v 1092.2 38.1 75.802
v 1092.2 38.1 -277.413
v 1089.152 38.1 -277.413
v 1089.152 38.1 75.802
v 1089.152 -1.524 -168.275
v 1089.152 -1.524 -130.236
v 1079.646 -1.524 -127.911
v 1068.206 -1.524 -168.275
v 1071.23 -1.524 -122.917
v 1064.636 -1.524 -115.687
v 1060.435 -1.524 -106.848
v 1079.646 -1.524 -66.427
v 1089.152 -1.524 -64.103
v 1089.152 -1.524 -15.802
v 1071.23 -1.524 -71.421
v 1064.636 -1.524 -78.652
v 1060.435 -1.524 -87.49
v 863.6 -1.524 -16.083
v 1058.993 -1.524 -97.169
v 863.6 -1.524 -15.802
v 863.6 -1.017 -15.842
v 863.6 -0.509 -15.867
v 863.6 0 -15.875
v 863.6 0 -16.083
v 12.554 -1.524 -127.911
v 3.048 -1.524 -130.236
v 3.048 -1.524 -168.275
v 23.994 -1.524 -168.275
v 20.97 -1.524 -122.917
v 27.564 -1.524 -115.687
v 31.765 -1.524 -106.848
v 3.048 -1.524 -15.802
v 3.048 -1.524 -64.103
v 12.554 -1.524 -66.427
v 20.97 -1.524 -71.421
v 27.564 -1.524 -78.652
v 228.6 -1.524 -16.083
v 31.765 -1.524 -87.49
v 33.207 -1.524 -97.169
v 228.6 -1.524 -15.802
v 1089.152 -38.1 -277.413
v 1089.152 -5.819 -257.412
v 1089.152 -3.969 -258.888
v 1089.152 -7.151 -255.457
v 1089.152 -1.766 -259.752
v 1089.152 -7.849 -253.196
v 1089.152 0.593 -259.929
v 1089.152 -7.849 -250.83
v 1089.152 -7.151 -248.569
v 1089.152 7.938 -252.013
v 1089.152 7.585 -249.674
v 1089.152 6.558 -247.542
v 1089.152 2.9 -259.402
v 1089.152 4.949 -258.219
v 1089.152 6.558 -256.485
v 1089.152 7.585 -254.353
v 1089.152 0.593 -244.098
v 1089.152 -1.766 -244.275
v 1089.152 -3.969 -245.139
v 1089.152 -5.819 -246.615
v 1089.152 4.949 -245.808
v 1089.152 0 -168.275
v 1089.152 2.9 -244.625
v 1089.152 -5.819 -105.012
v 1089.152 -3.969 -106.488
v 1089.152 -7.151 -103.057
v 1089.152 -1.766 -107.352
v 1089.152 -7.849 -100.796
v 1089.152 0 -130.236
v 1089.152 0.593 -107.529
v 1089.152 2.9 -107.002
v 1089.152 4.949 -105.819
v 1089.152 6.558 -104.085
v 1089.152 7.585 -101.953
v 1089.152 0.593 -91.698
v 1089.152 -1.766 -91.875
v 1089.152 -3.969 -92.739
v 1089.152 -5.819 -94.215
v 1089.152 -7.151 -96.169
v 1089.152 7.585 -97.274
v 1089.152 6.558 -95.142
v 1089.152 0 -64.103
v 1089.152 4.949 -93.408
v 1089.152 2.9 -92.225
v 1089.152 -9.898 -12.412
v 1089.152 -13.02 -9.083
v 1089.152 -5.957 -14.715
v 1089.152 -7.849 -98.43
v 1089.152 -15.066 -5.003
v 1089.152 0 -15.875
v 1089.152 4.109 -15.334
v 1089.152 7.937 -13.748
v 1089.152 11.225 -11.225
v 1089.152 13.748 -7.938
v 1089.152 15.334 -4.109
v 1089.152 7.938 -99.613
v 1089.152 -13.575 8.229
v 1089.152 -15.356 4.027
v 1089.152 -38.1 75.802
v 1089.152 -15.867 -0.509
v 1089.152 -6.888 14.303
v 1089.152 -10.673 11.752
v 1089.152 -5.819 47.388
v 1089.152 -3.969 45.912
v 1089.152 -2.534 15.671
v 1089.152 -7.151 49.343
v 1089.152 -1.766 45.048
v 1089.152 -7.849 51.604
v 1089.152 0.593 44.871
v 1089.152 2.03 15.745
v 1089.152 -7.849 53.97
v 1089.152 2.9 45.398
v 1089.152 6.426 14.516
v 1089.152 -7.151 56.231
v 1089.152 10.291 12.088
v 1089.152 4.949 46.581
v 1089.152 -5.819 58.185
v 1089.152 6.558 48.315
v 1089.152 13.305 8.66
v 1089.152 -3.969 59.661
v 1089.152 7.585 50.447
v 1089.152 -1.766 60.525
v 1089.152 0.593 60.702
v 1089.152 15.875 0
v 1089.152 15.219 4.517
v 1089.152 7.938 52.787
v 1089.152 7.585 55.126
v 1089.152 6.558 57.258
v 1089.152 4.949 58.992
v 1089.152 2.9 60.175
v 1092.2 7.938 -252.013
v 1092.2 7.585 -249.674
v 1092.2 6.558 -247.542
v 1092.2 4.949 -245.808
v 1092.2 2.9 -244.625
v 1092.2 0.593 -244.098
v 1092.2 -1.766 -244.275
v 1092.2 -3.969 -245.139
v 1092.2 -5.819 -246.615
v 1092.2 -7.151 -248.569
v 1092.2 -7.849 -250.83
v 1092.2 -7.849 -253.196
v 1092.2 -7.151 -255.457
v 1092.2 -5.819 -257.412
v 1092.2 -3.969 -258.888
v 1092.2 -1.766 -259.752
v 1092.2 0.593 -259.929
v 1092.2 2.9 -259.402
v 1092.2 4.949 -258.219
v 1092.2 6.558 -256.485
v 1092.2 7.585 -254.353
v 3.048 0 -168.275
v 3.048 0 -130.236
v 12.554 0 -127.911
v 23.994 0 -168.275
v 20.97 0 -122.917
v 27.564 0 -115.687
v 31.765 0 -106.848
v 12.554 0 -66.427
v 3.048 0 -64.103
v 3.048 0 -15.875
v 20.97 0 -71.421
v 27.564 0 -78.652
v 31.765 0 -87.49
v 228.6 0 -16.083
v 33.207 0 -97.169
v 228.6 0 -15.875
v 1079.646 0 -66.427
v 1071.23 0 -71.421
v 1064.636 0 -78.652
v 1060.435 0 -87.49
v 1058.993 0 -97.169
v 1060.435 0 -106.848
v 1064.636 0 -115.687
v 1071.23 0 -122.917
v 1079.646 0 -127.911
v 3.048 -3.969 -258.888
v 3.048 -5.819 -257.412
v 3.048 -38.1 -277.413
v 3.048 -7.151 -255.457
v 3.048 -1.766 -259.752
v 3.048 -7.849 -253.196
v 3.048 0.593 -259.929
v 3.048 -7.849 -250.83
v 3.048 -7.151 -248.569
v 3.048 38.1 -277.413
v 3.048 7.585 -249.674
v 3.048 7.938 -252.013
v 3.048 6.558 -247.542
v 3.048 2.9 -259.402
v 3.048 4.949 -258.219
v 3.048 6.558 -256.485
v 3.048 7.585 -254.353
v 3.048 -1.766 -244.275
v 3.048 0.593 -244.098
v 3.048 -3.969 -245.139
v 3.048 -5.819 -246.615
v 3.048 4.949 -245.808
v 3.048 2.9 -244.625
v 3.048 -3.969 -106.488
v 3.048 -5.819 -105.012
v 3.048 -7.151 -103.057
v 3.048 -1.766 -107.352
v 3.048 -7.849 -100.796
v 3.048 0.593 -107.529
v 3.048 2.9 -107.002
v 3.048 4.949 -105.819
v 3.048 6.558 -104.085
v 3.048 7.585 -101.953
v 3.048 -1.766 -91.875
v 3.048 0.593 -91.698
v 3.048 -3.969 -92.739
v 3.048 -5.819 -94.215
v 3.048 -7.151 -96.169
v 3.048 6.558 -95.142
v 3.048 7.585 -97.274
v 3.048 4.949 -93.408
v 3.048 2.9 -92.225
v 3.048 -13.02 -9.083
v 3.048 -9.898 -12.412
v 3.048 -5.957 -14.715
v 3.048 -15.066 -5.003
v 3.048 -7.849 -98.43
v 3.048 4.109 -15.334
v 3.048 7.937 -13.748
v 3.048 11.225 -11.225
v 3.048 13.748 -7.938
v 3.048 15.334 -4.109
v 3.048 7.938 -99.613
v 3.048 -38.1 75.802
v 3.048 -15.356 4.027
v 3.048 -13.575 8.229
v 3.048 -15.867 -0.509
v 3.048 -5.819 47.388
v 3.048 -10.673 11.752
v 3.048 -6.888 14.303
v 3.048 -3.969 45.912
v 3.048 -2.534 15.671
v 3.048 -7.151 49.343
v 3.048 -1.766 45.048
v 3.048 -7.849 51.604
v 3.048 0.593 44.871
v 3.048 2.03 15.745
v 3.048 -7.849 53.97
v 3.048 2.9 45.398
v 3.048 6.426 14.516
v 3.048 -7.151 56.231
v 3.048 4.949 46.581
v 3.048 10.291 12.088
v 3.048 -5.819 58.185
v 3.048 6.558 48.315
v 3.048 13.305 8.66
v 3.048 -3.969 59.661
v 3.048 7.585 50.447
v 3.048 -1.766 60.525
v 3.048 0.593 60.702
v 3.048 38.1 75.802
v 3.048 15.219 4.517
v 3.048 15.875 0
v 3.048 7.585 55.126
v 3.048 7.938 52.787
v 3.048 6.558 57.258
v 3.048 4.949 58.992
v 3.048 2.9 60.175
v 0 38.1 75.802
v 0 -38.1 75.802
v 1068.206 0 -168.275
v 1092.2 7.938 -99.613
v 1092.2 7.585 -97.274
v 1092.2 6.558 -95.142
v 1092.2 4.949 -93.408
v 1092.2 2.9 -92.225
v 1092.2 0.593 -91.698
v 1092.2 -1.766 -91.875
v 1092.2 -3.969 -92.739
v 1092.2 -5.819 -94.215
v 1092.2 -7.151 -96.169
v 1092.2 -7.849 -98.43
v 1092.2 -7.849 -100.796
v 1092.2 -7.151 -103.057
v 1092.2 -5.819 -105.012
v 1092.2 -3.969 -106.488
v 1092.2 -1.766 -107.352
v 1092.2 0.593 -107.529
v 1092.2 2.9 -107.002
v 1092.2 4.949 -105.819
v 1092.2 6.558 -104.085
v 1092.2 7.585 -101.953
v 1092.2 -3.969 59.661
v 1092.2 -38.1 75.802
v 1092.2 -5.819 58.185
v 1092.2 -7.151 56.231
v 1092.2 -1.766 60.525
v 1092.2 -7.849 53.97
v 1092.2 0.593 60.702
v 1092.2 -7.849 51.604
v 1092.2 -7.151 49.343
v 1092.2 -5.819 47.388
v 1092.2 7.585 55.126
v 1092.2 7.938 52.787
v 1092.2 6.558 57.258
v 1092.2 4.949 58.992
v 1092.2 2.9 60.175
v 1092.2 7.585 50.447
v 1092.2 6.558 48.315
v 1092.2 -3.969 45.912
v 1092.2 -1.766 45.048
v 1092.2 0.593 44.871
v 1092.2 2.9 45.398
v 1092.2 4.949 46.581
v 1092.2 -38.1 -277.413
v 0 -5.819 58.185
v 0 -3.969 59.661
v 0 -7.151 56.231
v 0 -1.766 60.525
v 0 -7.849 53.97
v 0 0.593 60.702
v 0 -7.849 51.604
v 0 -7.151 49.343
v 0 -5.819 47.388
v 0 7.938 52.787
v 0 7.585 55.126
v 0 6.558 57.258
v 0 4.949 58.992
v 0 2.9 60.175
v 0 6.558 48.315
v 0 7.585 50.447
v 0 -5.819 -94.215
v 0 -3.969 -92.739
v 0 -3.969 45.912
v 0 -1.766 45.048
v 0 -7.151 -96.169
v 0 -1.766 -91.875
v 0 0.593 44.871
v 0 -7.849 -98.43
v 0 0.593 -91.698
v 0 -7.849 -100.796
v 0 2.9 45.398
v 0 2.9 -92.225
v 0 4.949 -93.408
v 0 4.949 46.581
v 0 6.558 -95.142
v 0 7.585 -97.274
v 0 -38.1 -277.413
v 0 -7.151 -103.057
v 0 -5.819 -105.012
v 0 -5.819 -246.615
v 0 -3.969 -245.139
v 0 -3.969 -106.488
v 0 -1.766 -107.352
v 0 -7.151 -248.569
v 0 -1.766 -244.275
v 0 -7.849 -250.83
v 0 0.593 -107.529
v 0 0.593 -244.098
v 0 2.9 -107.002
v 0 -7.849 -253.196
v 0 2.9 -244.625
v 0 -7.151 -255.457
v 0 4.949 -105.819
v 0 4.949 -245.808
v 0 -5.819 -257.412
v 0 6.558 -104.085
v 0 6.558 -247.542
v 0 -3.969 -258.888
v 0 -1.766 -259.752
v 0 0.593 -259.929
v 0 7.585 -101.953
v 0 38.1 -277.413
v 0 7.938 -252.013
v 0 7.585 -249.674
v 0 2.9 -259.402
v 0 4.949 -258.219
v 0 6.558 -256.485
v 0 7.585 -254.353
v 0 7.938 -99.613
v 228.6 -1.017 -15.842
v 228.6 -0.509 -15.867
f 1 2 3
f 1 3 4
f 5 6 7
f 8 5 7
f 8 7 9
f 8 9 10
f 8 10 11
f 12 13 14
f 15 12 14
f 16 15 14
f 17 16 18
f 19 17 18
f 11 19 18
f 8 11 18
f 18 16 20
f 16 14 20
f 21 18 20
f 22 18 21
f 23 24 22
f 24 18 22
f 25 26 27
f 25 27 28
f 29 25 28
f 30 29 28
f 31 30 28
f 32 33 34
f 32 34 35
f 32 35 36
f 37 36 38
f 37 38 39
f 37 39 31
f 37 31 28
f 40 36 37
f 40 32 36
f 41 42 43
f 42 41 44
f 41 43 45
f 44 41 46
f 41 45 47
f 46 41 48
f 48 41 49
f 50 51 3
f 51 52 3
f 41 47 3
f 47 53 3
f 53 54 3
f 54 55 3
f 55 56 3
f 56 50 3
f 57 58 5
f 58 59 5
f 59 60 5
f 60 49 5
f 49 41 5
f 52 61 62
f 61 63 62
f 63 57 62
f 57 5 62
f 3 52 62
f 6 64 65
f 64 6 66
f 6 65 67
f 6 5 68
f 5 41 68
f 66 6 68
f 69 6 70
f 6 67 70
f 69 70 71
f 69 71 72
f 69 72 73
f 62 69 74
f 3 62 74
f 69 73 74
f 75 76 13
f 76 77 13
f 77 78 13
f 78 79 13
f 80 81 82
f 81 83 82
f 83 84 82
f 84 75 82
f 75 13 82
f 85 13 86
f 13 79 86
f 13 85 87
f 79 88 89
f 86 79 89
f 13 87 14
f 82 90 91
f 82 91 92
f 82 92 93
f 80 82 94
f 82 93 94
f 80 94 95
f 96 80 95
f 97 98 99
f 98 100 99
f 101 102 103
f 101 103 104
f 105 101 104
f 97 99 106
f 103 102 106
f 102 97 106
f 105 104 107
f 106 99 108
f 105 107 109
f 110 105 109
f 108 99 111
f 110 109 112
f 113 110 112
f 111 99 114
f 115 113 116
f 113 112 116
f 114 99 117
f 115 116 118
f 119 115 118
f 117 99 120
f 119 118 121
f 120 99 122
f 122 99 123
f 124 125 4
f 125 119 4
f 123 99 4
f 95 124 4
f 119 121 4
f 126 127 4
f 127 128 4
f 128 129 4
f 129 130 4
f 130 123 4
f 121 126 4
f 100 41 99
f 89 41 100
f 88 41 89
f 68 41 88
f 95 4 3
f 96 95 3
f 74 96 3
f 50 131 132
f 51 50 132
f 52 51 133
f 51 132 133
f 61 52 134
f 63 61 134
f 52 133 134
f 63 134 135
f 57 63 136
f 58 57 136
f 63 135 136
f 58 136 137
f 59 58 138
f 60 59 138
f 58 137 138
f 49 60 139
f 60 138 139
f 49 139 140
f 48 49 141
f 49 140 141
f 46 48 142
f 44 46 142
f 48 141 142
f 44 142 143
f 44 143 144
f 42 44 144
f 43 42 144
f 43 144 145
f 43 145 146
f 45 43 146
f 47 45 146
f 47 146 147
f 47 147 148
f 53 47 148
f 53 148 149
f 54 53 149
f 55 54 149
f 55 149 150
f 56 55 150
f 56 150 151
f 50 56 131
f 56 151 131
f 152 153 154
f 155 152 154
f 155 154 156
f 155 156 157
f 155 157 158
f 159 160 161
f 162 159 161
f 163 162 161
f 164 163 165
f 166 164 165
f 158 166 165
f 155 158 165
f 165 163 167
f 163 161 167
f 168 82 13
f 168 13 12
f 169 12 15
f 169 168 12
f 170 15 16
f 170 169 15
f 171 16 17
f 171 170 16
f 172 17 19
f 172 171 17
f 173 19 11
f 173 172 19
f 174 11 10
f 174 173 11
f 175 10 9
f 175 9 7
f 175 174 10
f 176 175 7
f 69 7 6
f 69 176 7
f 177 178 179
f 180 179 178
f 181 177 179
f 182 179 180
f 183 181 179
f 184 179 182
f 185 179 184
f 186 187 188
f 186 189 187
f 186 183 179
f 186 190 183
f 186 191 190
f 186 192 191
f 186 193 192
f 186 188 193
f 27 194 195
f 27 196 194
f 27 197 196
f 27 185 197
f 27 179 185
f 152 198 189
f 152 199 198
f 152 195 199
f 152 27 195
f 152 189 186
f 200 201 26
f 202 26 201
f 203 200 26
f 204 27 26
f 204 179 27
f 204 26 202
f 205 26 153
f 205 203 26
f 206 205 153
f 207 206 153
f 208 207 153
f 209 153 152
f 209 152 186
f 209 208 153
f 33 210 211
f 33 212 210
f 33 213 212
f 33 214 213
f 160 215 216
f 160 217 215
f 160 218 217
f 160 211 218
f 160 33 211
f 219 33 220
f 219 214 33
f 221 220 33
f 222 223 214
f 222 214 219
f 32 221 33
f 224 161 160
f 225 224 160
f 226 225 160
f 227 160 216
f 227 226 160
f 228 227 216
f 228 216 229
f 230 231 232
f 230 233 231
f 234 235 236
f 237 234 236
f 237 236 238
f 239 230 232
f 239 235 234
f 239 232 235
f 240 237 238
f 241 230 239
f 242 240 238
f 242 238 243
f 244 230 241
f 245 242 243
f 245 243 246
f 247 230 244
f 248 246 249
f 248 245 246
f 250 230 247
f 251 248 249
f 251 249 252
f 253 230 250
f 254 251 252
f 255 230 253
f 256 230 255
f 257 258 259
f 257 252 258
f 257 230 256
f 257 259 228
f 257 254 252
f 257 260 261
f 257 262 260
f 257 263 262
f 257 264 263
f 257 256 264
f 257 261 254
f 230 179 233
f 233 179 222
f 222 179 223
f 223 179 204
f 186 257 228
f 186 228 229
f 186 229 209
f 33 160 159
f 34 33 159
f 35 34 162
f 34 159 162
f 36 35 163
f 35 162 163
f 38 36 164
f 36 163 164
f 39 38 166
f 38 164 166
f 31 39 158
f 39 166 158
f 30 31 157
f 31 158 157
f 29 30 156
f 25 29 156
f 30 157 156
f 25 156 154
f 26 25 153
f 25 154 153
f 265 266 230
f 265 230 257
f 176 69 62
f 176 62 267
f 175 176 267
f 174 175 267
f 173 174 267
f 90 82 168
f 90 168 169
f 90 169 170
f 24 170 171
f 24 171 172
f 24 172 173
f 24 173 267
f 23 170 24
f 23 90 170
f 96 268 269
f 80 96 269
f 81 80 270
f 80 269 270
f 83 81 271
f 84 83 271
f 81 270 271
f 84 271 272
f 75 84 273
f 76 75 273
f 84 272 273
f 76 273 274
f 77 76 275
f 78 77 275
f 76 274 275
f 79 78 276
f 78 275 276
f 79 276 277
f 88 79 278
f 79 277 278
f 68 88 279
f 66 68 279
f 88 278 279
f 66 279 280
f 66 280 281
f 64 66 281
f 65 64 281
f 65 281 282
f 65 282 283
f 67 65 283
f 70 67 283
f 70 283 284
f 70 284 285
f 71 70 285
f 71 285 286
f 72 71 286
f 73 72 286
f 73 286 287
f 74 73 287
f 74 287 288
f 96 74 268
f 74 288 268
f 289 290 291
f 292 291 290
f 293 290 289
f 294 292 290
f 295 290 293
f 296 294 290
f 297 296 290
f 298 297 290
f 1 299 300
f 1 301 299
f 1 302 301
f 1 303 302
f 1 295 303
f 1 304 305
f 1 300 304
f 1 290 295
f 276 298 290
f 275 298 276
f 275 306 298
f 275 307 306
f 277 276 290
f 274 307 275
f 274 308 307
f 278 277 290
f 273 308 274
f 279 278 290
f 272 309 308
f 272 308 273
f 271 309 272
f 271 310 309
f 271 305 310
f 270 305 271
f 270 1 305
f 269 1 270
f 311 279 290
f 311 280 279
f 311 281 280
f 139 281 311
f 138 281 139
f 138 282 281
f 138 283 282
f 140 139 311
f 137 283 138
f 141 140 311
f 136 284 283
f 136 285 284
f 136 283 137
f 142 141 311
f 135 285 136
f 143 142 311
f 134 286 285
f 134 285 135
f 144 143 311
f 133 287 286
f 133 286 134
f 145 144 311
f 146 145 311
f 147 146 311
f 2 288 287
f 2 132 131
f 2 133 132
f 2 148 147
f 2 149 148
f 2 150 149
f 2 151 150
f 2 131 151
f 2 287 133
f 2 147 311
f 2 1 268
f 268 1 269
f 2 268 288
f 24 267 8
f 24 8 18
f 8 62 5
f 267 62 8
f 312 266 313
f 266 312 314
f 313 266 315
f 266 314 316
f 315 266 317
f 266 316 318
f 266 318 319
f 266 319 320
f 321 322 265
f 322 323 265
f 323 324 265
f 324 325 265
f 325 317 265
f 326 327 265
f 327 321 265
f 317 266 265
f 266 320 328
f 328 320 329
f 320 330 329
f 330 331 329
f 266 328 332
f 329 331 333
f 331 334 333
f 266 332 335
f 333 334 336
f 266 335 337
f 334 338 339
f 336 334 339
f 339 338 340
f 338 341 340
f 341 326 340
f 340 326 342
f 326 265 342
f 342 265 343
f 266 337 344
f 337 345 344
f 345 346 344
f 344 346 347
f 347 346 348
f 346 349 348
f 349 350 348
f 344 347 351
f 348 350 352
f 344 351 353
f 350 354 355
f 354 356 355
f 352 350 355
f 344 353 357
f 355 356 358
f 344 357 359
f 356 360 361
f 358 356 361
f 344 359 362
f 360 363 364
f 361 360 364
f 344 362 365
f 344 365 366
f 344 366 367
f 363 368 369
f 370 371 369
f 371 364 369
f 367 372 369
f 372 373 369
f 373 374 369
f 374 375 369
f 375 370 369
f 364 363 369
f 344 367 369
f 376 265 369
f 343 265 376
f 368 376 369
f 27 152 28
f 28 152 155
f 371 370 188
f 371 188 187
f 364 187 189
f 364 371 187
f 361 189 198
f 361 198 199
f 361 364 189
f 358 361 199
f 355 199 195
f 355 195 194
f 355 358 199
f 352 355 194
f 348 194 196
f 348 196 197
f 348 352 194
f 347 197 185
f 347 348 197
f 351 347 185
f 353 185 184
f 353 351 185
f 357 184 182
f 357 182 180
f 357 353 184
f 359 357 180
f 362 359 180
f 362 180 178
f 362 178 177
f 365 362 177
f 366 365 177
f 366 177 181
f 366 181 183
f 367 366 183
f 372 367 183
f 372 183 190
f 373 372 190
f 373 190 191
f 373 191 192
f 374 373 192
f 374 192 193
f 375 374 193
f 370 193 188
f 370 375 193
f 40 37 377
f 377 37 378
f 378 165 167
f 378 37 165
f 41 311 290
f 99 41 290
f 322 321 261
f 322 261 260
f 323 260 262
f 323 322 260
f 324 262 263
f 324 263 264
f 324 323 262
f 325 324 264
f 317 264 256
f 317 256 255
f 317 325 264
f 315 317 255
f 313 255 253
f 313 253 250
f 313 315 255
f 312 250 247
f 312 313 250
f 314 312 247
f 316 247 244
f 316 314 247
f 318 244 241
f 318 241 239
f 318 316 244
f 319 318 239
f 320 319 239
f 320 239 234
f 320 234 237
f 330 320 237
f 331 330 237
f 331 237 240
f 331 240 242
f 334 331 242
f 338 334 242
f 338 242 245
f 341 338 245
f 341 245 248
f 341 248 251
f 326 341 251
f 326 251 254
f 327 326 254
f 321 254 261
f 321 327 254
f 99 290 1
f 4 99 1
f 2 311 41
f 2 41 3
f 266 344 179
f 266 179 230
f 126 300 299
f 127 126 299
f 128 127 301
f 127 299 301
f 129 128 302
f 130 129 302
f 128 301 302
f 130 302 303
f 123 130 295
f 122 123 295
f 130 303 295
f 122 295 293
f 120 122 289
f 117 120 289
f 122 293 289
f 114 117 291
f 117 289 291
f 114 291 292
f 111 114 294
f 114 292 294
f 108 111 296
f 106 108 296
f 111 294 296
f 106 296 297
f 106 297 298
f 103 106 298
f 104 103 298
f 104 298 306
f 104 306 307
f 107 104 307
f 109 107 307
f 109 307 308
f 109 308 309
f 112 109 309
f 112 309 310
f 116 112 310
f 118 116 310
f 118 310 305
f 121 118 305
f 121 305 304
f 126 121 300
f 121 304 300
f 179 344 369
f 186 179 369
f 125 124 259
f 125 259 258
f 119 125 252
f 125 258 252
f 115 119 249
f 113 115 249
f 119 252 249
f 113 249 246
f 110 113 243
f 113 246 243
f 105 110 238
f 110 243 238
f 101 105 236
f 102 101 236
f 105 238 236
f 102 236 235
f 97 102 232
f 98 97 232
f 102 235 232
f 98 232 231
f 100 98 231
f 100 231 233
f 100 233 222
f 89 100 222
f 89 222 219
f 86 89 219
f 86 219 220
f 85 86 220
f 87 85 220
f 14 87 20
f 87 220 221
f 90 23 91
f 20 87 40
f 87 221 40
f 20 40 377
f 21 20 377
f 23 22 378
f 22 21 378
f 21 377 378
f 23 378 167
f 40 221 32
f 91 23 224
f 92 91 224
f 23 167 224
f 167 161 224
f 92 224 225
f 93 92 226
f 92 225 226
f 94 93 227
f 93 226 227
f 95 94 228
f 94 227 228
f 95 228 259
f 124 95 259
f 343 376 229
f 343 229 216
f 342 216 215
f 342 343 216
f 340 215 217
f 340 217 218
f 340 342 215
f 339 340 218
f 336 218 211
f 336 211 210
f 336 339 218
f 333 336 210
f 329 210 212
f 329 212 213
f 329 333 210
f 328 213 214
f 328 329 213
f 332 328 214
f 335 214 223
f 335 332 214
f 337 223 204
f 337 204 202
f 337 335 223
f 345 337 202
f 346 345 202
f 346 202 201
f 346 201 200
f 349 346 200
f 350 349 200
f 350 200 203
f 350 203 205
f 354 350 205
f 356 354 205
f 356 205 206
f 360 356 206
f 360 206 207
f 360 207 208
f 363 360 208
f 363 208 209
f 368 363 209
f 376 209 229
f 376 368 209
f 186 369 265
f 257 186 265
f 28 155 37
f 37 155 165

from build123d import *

# Parameters (mm, degrees)
F0_R     = 15.875
F1_DEPTH = 1092.2
F0_W     = 76.2
F0_H     = 353.215248
F0_R_2   = 7.9375
F4_DEPTH = 3.048
F5_DEPTH = 1.524
F6_DEPTH = 1.524


with BuildPart() as f1:
    # F0 (on Right) → F1 (new body)
    with BuildSketch(Plane.YZ):
        Circle(F0_R)
    extrude(amount=F1_DEPTH)

    # F0 (on Right) → F4 (join)
    with BuildSketch(Plane.YZ):
        with Locations((0, -100.805804)):
            Rectangle(F0_W, F0_H)
        with Locations((0, -252.013428)):
            Circle(F0_R_2, mode=Mode.SUBTRACT)
        with Locations((0, -99.613428)):
            Circle(F0_R_2, mode=Mode.SUBTRACT)
        Circle(F0_R, mode=Mode.SUBTRACT)
        with Locations((0, 52.786572)):
            Circle(F0_R_2, mode=Mode.SUBTRACT)
    extrude(amount=F4_DEPTH)

    # F2 (on Front) → F5 (join)
    with BuildSketch(Plane.XZ):
        with BuildLine():
            Line((228.6, 0), (0, 0))
            Line((0, 0), (0, -63.962556))
            ThreePointArc((0, -63.962556), (33.206645, -97.169202), (0, -130.375847))
            Line((0, -130.375847), (0, -168.275))
            Line((0, -168.275), (23.993986, -168.275))
            Line((23.993986, -168.275), (228.6, -16.082697))
            Line((228.6, -16.082697), (228.6, 0))
        make_face()
    extrude(amount=F5_DEPTH)

    # F2 (on Front) → F6 (join)
    with BuildSketch(Plane.XZ):
        with BuildLine():
            Line((228.6, 0), (0, 0))
            Line((0, 0), (0, -63.962556))
            ThreePointArc((0, -63.962556), (33.206645, -97.169202), (0, -130.375847))
            Line((0, -130.375847), (0, -168.275))
            Line((0, -168.275), (23.993986, -168.275))
            Line((23.993986, -168.275), (228.6, -16.082697))
            Line((228.6, -16.082697), (228.6, 0))
        make_face()
    extrude(amount=F6_DEPTH)

    # F7: F1 across plane


with BuildPart() as f1_1:
    add(f1.part)
    add(f1.part.mirror(Plane.YZ.offset(546.1)))


solid = f1_1.part
